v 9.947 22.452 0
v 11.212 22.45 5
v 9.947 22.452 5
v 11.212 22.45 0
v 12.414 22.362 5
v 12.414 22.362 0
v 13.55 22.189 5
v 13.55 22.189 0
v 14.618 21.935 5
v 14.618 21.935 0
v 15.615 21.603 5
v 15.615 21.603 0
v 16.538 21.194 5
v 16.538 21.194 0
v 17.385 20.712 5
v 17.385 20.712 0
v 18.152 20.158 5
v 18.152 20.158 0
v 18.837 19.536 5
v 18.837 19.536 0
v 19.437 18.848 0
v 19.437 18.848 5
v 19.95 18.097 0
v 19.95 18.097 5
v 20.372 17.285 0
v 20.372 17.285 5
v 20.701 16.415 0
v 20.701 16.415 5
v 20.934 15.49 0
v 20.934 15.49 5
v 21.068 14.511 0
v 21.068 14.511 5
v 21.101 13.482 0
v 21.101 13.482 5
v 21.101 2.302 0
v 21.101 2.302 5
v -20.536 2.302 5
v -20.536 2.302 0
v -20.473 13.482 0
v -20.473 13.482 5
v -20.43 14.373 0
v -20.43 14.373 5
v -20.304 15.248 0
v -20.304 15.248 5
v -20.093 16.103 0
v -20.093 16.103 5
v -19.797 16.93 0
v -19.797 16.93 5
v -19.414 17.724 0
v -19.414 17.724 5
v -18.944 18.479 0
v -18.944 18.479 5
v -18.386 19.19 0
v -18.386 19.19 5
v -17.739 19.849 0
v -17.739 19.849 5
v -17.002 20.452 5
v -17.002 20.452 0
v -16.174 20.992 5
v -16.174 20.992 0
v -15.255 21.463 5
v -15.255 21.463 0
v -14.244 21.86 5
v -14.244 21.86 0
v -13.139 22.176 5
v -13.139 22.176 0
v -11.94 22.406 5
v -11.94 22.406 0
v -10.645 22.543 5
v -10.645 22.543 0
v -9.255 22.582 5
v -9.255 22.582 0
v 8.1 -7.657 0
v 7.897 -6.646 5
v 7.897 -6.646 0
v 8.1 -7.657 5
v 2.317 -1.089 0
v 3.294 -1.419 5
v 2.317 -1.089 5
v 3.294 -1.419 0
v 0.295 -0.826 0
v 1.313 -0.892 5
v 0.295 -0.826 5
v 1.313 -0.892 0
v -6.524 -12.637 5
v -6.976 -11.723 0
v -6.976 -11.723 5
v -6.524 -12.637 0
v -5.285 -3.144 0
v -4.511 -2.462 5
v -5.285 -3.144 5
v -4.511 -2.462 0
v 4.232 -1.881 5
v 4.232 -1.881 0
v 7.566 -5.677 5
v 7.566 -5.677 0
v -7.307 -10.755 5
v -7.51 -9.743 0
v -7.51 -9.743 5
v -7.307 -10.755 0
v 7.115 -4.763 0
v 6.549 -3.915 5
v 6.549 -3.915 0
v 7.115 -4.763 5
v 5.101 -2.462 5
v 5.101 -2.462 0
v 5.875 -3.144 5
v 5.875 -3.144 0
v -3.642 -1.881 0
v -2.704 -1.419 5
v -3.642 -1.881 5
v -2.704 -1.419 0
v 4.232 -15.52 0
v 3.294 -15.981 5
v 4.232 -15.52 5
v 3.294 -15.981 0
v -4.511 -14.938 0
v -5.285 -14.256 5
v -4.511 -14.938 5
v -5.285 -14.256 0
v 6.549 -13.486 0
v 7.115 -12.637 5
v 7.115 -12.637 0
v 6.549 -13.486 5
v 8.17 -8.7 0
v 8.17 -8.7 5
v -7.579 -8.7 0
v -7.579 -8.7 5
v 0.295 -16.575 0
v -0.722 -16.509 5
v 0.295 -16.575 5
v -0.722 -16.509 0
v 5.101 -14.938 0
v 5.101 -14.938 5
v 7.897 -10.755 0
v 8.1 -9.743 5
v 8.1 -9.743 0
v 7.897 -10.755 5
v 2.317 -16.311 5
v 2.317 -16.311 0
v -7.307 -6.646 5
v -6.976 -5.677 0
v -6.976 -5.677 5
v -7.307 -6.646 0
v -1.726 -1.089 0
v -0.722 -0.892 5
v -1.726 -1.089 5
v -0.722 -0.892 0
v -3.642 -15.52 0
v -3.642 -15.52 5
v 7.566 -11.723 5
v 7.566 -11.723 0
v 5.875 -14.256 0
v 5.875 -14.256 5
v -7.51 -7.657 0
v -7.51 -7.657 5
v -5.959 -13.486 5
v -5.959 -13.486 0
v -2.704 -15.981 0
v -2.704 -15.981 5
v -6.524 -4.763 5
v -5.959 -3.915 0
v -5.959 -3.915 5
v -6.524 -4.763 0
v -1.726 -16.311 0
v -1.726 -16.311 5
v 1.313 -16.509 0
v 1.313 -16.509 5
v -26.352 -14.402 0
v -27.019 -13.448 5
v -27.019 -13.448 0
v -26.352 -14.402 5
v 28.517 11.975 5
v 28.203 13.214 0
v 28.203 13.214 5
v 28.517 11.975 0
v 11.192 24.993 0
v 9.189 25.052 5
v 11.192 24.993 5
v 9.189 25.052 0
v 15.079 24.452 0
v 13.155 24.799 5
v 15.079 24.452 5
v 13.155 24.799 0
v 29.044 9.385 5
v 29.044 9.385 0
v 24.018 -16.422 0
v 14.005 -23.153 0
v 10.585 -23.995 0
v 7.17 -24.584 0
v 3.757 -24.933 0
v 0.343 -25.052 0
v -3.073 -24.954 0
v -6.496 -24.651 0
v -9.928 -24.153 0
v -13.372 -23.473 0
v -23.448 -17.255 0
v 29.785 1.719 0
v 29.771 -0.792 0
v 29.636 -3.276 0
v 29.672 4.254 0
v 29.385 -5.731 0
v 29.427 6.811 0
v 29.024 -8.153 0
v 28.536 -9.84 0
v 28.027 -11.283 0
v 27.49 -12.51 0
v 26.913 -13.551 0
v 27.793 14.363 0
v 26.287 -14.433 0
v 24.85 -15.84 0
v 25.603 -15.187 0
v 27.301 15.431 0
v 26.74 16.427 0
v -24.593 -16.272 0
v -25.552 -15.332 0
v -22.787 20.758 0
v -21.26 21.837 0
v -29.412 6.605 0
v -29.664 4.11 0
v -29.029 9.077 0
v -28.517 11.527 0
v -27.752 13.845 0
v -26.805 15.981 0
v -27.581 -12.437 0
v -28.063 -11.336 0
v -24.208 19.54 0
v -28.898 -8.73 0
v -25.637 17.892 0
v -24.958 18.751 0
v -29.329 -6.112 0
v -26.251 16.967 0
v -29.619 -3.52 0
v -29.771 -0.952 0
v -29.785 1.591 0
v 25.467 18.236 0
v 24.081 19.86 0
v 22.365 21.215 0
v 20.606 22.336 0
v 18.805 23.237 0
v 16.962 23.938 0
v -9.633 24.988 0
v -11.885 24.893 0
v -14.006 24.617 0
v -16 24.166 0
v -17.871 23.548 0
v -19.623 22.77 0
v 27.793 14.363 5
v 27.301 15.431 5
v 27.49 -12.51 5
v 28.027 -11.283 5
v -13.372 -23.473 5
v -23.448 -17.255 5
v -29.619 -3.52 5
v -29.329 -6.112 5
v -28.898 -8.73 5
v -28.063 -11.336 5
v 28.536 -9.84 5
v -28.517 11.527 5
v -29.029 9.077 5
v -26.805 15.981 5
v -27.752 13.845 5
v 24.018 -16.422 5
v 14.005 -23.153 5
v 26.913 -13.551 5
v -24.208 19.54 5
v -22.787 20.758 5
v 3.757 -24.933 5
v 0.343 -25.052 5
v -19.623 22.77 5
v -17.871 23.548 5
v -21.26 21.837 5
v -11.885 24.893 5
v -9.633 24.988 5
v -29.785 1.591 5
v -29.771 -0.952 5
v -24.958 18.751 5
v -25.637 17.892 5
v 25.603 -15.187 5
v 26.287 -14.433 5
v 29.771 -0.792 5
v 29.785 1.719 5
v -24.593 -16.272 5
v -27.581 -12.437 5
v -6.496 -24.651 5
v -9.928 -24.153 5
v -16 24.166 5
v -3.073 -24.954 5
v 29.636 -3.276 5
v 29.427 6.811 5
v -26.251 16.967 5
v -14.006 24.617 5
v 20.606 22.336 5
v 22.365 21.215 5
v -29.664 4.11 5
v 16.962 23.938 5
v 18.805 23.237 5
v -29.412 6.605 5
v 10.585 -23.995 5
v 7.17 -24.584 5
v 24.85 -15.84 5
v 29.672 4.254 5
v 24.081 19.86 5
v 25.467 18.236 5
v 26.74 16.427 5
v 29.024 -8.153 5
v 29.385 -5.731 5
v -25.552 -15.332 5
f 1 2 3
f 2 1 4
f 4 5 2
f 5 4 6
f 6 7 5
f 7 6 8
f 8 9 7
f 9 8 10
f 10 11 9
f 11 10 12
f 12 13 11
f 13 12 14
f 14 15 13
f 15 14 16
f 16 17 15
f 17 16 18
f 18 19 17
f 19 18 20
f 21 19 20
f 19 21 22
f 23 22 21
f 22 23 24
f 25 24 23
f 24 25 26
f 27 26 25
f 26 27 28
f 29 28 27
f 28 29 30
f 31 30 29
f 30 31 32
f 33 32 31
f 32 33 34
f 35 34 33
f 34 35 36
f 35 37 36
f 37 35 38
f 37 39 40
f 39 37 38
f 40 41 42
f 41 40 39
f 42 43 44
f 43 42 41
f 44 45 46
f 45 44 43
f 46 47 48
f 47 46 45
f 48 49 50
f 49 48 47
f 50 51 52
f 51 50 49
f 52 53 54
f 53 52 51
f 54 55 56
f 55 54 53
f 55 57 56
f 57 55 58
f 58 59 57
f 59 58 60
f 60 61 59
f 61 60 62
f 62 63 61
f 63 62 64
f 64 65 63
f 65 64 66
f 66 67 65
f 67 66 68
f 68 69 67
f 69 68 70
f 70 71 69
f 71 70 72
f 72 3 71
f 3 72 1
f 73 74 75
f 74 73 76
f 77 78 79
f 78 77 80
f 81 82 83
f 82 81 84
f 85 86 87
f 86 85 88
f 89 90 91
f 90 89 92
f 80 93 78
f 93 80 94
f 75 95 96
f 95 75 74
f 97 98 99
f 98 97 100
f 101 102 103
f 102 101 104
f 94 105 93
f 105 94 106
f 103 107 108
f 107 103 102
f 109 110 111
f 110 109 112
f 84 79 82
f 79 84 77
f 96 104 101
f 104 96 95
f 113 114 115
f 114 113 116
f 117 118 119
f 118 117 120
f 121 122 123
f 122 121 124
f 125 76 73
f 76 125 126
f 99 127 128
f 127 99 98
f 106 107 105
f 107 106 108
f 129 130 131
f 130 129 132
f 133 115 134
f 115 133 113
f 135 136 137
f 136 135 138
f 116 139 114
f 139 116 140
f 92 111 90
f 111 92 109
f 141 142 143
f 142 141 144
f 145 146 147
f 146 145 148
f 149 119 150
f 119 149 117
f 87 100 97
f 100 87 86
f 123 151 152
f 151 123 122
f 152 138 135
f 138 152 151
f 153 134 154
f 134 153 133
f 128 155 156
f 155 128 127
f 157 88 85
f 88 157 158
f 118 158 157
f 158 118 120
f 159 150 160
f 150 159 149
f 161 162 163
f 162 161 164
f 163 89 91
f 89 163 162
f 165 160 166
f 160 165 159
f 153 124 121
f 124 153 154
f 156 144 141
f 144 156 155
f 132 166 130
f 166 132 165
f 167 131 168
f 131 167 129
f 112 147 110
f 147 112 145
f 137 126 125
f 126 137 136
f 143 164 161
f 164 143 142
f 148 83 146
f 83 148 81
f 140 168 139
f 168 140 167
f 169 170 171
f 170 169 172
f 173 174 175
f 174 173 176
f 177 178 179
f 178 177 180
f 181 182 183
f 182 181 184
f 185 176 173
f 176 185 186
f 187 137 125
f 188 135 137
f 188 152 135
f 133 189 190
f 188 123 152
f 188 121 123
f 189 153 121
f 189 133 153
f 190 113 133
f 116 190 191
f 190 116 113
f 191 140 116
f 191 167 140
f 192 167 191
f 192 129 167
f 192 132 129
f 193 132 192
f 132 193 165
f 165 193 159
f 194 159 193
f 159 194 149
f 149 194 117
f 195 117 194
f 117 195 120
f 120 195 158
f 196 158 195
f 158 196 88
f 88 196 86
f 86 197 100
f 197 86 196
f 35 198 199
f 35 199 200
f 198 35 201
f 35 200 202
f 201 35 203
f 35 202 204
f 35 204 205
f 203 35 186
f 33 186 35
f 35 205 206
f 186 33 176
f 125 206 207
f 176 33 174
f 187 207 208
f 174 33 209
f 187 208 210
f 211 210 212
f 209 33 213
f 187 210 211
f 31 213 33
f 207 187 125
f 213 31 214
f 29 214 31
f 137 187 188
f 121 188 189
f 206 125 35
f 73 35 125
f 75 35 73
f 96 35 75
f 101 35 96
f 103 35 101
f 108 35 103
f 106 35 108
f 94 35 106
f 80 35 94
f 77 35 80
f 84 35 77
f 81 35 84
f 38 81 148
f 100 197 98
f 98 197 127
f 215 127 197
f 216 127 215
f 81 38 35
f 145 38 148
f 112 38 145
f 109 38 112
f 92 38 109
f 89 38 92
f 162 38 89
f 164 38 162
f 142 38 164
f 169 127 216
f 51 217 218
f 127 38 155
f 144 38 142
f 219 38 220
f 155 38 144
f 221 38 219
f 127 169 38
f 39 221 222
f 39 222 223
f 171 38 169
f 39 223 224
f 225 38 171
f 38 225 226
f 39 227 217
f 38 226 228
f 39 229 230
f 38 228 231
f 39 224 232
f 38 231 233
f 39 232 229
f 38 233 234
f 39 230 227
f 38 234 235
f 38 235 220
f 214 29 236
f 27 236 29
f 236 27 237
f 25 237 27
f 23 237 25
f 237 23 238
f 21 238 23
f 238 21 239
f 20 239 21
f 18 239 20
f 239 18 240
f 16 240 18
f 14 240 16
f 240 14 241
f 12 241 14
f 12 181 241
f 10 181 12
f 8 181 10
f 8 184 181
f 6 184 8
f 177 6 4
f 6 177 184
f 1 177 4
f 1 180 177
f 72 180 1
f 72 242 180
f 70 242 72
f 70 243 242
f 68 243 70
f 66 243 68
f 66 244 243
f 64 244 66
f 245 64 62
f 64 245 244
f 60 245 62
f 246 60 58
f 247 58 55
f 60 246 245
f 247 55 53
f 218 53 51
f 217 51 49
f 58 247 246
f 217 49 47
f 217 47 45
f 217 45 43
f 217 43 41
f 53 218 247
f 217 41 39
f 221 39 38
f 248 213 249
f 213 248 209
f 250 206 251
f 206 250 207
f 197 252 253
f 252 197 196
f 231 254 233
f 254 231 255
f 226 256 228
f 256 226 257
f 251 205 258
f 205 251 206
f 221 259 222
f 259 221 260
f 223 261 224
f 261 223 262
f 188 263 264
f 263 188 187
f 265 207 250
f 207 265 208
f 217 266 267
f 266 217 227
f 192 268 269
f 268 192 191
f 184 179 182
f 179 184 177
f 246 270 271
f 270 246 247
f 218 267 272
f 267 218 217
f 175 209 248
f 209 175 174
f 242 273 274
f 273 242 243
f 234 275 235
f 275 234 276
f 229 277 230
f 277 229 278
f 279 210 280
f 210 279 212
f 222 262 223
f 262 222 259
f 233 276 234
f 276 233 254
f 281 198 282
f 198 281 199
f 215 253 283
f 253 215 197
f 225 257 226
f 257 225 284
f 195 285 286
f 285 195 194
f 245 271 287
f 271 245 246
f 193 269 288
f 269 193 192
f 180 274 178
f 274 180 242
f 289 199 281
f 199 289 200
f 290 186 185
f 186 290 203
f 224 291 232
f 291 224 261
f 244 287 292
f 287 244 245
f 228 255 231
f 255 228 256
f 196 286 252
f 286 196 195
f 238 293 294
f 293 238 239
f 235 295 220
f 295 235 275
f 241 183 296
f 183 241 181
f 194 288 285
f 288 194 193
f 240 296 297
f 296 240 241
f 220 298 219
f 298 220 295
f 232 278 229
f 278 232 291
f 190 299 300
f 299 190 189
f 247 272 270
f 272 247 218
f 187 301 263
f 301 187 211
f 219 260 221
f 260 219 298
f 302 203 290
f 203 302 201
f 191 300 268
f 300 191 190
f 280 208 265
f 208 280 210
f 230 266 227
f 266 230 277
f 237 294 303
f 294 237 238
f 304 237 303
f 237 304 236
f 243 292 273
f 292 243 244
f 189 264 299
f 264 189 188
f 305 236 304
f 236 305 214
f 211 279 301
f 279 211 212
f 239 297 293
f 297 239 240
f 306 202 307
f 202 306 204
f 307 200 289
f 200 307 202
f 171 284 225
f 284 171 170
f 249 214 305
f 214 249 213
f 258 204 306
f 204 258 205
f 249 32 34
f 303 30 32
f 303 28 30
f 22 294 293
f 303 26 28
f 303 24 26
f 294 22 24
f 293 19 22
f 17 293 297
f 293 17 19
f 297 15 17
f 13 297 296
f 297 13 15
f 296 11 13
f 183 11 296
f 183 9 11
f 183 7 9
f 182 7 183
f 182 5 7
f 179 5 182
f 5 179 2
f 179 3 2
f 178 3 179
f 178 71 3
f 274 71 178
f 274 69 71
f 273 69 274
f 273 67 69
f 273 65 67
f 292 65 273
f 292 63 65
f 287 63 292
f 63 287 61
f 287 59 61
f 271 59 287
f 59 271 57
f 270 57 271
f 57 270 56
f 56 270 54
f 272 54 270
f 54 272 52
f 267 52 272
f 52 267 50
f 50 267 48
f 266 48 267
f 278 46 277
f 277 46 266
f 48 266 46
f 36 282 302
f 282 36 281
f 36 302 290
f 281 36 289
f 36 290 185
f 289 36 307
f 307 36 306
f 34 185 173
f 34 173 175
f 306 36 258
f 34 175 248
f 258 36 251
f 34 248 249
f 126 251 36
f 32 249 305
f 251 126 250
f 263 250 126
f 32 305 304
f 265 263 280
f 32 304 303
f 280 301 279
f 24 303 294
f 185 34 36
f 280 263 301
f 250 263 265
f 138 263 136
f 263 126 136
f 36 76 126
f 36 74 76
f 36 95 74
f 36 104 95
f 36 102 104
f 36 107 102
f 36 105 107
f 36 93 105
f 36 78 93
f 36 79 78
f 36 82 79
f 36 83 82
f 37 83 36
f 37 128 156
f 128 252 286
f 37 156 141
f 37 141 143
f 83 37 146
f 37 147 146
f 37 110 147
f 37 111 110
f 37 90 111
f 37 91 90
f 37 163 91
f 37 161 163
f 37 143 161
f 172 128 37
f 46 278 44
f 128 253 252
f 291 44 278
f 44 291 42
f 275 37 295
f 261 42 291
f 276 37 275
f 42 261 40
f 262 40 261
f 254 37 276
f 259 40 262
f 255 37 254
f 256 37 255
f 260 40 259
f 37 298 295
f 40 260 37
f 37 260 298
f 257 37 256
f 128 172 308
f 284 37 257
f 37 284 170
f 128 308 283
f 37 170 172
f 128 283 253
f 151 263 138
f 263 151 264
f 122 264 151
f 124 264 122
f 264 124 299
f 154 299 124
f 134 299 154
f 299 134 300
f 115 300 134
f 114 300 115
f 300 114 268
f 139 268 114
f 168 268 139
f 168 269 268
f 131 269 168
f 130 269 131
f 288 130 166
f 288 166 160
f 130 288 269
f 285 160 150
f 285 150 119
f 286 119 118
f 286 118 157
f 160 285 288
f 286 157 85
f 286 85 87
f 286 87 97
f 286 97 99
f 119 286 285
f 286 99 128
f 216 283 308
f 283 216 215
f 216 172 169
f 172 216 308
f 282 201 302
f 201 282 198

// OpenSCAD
// Generated by inkscape 0.92.4 (5da689c313, 2019-01-14) + inkscape-paths2openscad 0.26
// Sun Apr  5 00:43:30 2020 from "valve.svg"

// Module names are of the form poly_<inkscape-path-id>().  As a result,
// you can associate a polygon in this OpenSCAD program with the corresponding
// SVG element in the Inkscape document by looking for the XML element with
// the attribute id="inkscape-path-id".

// fudge value is used to ensure that subtracted solids are a tad taller
// in the z dimension than the polygon being subtracted from.  This helps
// keep the resulting .stl file manifold.
fudge = 0.1;
zsize = 5;
line_fn = 4;
min_line_width = 1.0;
line_width_scale = 1.0;
function min_line_mm(w) = max(min_line_width, w * line_width_scale) * 96/25.4;


path3803_0_center = [1.068299,-47.024898];
path3803_0_points = [[-77.616789,-8.699061],[79.753387,-8.699061],[79.753387,-50.955756],[79.628776,-54.845115],[79.120737,-58.543871],[78.239715,-62.042288],[76.996151,-65.330624],[75.400490,-68.399141],[73.463172,-71.238100],[71.194643,-73.837762],[68.605343,-76.188388],[65.705717,-78.280237],[62.506207,-80.103573],[59.017255,-81.648654],[55.249306,-82.905742],[51.212801,-83.865098],[46.918183,-84.516983],[42.375895,-84.851657],[37.596381,-84.859381],[-34.980648,-85.350735],[-40.234440,-85.203377],[-45.125692,-84.684321],[-49.657692,-83.816008],[-53.833726,-82.620877],[-57.657081,-81.121370],[-61.131045,-79.339924],[-64.258904,-77.298982],[-67.043944,-75.020983],[-69.489454,-72.528367],[-71.598720,-69.843574],[-73.375028,-66.989045],[-74.821667,-63.987219],[-75.941922,-60.860537],[-76.739081,-57.631438],[-77.216431,-54.322363],[-77.377258,-50.955753],[-77.616789,-8.699061]];
module poly_path3803(h, w, s, res=line_fn)
{
  scale([25.4/96, -25.4/96, 1]) union()
  {
    translate (path3803_0_center) linear_extrude(height=h, convexity=10, scale=0.01*s)
      translate (-path3803_0_center) polygon(path3803_0_points);
  }
}

path3799_0_center = [1.115394,32.882403];
path3799_0_points = [[-28.646307,32.882403],[-28.384580,36.824626],[-27.616092,40.647756],[-26.365883,44.308422],[-24.658995,47.763253],[-22.520468,50.968877],[-19.975342,53.881923],[-17.048658,56.459018],[-13.765457,58.656792],[-10.220528,60.401241],[-6.525356,61.647276],[-2.730022,62.394897],[1.115394,62.644104],[4.960809,62.394897],[8.756144,61.647276],[12.451316,60.401241],[15.996244,58.656792],[19.279446,56.459018],[22.206130,53.881923],[24.751256,50.968877],[26.889783,47.763253],[28.596671,44.308422],[29.846879,40.647756],[30.615367,36.824626],[30.877094,32.882403],[30.615367,28.940180],[29.846879,25.117050],[28.596671,21.456383],[26.889782,18.001552],[24.751255,14.795929],[22.206129,11.882883],[19.279445,9.305788],[15.996244,7.108014],[12.451315,5.363565],[8.756143,4.117530],[4.960809,3.369909],[1.115394,3.120702],[-2.730022,3.369909],[-6.525356,4.117530],[-10.220528,5.363565],[-13.765456,7.108014],[-17.048658,9.305788],[-19.975342,11.882883],[-22.520468,14.795929],[-24.658995,18.001552],[-26.365883,21.456383],[-27.616091,25.117050],[-28.384579,28.940180],[-28.646307,32.882403]];
module poly_path3799(h, w, s, res=line_fn)
{
  scale([25.4/96, -25.4/96, 1]) union()
  {
    translate (path3799_0_center) linear_extrude(height=h, convexity=10, scale=0.01*s)
      translate (-path3799_0_center) polygon(path3799_0_points);
  }
}

path3807_0_center = [0.000000,0.000000];
path3807_0_points = [[-88.621312,65.217482],[-50.538104,88.718489],[-37.522510,91.287597],[-24.551825,93.168205],[-11.615263,94.315915],[1.297962,94.686332],[14.198637,94.235056],[27.097546,92.917690],[40.005477,90.689838],[52.933214,87.507101],[90.776910,62.067850],[93.919708,59.867563],[96.766004,57.398288],[99.352967,54.550739],[101.717769,51.215632],[103.897581,47.283681],[105.929572,42.645604],[107.850914,37.192114],[109.698776,30.813927],[111.063123,21.660403],[112.010704,12.383506],[112.520779,2.994079],[112.572607,-6.497035],[112.145447,-16.078995],[111.218558,-25.740957],[109.771200,-35.472080],[107.782631,-45.261520],[106.593562,-49.943869],[105.043484,-54.286763],[103.183373,-58.323168],[101.064204,-62.086054],[96.252594,-68.923142],[91.016456,-75.061775],[84.528482,-80.184030],[77.879887,-84.418029],[71.072718,-87.826589],[64.109023,-90.472524],[56.990851,-92.418651],[49.720249,-93.727784],[42.299266,-94.462739],[34.729949,-94.686332],[-36.406589,-94.444064],[-44.919606,-94.085056],[-52.935908,-93.040787],[-60.471439,-91.337431],[-67.542141,-89.001160],[-74.163956,-86.058148],[-80.352828,-82.534567],[-86.124699,-78.456590],[-91.495511,-73.850391],[-94.328302,-70.870875],[-96.895929,-67.623137],[-99.217132,-64.126132],[-101.310649,-60.398818],[-104.889588,-52.329082],[-107.782665,-43.565577],[-109.714306,-34.308318],[-111.162077,-24.964685],[-112.117628,-15.533188],[-112.572607,-6.012337],[-112.518662,3.599360],[-111.947441,13.303392],[-110.850595,23.101252],[-109.219770,32.994428],[-106.064250,42.843609],[-104.241445,47.005294],[-102.120088,50.826137],[-99.598788,54.431957],[-96.576153,57.948575],[-92.950792,61.501813],[-88.621312,65.217489],[-88.621312,65.217482]];
module poly_path3807(h, w, s, res=line_fn)
{
  scale([25.4/96, -25.4/96, 1]) union()
  {
    translate (path3807_0_center) linear_extrude(height=h, convexity=10, scale=0.01*s)
      translate (-path3807_0_center) polygon(path3807_0_points);
  }
}

module valve(h)
{
  difference()
  {
    union()
    {
      translate ([0,0,0]) poly_path3807(h, min_line_mm(0.0704034289583), 100.0);
    }
    union()
    {
      translate ([0,0,-1]) poly_path3803(h+2, min_line_mm(0.0708973663542), 100.0);
      translate ([0,0,-1]) poly_path3799(h+2, min_line_mm(0.25110108), 100.0);
    }
  }
}

valve(zsize);
